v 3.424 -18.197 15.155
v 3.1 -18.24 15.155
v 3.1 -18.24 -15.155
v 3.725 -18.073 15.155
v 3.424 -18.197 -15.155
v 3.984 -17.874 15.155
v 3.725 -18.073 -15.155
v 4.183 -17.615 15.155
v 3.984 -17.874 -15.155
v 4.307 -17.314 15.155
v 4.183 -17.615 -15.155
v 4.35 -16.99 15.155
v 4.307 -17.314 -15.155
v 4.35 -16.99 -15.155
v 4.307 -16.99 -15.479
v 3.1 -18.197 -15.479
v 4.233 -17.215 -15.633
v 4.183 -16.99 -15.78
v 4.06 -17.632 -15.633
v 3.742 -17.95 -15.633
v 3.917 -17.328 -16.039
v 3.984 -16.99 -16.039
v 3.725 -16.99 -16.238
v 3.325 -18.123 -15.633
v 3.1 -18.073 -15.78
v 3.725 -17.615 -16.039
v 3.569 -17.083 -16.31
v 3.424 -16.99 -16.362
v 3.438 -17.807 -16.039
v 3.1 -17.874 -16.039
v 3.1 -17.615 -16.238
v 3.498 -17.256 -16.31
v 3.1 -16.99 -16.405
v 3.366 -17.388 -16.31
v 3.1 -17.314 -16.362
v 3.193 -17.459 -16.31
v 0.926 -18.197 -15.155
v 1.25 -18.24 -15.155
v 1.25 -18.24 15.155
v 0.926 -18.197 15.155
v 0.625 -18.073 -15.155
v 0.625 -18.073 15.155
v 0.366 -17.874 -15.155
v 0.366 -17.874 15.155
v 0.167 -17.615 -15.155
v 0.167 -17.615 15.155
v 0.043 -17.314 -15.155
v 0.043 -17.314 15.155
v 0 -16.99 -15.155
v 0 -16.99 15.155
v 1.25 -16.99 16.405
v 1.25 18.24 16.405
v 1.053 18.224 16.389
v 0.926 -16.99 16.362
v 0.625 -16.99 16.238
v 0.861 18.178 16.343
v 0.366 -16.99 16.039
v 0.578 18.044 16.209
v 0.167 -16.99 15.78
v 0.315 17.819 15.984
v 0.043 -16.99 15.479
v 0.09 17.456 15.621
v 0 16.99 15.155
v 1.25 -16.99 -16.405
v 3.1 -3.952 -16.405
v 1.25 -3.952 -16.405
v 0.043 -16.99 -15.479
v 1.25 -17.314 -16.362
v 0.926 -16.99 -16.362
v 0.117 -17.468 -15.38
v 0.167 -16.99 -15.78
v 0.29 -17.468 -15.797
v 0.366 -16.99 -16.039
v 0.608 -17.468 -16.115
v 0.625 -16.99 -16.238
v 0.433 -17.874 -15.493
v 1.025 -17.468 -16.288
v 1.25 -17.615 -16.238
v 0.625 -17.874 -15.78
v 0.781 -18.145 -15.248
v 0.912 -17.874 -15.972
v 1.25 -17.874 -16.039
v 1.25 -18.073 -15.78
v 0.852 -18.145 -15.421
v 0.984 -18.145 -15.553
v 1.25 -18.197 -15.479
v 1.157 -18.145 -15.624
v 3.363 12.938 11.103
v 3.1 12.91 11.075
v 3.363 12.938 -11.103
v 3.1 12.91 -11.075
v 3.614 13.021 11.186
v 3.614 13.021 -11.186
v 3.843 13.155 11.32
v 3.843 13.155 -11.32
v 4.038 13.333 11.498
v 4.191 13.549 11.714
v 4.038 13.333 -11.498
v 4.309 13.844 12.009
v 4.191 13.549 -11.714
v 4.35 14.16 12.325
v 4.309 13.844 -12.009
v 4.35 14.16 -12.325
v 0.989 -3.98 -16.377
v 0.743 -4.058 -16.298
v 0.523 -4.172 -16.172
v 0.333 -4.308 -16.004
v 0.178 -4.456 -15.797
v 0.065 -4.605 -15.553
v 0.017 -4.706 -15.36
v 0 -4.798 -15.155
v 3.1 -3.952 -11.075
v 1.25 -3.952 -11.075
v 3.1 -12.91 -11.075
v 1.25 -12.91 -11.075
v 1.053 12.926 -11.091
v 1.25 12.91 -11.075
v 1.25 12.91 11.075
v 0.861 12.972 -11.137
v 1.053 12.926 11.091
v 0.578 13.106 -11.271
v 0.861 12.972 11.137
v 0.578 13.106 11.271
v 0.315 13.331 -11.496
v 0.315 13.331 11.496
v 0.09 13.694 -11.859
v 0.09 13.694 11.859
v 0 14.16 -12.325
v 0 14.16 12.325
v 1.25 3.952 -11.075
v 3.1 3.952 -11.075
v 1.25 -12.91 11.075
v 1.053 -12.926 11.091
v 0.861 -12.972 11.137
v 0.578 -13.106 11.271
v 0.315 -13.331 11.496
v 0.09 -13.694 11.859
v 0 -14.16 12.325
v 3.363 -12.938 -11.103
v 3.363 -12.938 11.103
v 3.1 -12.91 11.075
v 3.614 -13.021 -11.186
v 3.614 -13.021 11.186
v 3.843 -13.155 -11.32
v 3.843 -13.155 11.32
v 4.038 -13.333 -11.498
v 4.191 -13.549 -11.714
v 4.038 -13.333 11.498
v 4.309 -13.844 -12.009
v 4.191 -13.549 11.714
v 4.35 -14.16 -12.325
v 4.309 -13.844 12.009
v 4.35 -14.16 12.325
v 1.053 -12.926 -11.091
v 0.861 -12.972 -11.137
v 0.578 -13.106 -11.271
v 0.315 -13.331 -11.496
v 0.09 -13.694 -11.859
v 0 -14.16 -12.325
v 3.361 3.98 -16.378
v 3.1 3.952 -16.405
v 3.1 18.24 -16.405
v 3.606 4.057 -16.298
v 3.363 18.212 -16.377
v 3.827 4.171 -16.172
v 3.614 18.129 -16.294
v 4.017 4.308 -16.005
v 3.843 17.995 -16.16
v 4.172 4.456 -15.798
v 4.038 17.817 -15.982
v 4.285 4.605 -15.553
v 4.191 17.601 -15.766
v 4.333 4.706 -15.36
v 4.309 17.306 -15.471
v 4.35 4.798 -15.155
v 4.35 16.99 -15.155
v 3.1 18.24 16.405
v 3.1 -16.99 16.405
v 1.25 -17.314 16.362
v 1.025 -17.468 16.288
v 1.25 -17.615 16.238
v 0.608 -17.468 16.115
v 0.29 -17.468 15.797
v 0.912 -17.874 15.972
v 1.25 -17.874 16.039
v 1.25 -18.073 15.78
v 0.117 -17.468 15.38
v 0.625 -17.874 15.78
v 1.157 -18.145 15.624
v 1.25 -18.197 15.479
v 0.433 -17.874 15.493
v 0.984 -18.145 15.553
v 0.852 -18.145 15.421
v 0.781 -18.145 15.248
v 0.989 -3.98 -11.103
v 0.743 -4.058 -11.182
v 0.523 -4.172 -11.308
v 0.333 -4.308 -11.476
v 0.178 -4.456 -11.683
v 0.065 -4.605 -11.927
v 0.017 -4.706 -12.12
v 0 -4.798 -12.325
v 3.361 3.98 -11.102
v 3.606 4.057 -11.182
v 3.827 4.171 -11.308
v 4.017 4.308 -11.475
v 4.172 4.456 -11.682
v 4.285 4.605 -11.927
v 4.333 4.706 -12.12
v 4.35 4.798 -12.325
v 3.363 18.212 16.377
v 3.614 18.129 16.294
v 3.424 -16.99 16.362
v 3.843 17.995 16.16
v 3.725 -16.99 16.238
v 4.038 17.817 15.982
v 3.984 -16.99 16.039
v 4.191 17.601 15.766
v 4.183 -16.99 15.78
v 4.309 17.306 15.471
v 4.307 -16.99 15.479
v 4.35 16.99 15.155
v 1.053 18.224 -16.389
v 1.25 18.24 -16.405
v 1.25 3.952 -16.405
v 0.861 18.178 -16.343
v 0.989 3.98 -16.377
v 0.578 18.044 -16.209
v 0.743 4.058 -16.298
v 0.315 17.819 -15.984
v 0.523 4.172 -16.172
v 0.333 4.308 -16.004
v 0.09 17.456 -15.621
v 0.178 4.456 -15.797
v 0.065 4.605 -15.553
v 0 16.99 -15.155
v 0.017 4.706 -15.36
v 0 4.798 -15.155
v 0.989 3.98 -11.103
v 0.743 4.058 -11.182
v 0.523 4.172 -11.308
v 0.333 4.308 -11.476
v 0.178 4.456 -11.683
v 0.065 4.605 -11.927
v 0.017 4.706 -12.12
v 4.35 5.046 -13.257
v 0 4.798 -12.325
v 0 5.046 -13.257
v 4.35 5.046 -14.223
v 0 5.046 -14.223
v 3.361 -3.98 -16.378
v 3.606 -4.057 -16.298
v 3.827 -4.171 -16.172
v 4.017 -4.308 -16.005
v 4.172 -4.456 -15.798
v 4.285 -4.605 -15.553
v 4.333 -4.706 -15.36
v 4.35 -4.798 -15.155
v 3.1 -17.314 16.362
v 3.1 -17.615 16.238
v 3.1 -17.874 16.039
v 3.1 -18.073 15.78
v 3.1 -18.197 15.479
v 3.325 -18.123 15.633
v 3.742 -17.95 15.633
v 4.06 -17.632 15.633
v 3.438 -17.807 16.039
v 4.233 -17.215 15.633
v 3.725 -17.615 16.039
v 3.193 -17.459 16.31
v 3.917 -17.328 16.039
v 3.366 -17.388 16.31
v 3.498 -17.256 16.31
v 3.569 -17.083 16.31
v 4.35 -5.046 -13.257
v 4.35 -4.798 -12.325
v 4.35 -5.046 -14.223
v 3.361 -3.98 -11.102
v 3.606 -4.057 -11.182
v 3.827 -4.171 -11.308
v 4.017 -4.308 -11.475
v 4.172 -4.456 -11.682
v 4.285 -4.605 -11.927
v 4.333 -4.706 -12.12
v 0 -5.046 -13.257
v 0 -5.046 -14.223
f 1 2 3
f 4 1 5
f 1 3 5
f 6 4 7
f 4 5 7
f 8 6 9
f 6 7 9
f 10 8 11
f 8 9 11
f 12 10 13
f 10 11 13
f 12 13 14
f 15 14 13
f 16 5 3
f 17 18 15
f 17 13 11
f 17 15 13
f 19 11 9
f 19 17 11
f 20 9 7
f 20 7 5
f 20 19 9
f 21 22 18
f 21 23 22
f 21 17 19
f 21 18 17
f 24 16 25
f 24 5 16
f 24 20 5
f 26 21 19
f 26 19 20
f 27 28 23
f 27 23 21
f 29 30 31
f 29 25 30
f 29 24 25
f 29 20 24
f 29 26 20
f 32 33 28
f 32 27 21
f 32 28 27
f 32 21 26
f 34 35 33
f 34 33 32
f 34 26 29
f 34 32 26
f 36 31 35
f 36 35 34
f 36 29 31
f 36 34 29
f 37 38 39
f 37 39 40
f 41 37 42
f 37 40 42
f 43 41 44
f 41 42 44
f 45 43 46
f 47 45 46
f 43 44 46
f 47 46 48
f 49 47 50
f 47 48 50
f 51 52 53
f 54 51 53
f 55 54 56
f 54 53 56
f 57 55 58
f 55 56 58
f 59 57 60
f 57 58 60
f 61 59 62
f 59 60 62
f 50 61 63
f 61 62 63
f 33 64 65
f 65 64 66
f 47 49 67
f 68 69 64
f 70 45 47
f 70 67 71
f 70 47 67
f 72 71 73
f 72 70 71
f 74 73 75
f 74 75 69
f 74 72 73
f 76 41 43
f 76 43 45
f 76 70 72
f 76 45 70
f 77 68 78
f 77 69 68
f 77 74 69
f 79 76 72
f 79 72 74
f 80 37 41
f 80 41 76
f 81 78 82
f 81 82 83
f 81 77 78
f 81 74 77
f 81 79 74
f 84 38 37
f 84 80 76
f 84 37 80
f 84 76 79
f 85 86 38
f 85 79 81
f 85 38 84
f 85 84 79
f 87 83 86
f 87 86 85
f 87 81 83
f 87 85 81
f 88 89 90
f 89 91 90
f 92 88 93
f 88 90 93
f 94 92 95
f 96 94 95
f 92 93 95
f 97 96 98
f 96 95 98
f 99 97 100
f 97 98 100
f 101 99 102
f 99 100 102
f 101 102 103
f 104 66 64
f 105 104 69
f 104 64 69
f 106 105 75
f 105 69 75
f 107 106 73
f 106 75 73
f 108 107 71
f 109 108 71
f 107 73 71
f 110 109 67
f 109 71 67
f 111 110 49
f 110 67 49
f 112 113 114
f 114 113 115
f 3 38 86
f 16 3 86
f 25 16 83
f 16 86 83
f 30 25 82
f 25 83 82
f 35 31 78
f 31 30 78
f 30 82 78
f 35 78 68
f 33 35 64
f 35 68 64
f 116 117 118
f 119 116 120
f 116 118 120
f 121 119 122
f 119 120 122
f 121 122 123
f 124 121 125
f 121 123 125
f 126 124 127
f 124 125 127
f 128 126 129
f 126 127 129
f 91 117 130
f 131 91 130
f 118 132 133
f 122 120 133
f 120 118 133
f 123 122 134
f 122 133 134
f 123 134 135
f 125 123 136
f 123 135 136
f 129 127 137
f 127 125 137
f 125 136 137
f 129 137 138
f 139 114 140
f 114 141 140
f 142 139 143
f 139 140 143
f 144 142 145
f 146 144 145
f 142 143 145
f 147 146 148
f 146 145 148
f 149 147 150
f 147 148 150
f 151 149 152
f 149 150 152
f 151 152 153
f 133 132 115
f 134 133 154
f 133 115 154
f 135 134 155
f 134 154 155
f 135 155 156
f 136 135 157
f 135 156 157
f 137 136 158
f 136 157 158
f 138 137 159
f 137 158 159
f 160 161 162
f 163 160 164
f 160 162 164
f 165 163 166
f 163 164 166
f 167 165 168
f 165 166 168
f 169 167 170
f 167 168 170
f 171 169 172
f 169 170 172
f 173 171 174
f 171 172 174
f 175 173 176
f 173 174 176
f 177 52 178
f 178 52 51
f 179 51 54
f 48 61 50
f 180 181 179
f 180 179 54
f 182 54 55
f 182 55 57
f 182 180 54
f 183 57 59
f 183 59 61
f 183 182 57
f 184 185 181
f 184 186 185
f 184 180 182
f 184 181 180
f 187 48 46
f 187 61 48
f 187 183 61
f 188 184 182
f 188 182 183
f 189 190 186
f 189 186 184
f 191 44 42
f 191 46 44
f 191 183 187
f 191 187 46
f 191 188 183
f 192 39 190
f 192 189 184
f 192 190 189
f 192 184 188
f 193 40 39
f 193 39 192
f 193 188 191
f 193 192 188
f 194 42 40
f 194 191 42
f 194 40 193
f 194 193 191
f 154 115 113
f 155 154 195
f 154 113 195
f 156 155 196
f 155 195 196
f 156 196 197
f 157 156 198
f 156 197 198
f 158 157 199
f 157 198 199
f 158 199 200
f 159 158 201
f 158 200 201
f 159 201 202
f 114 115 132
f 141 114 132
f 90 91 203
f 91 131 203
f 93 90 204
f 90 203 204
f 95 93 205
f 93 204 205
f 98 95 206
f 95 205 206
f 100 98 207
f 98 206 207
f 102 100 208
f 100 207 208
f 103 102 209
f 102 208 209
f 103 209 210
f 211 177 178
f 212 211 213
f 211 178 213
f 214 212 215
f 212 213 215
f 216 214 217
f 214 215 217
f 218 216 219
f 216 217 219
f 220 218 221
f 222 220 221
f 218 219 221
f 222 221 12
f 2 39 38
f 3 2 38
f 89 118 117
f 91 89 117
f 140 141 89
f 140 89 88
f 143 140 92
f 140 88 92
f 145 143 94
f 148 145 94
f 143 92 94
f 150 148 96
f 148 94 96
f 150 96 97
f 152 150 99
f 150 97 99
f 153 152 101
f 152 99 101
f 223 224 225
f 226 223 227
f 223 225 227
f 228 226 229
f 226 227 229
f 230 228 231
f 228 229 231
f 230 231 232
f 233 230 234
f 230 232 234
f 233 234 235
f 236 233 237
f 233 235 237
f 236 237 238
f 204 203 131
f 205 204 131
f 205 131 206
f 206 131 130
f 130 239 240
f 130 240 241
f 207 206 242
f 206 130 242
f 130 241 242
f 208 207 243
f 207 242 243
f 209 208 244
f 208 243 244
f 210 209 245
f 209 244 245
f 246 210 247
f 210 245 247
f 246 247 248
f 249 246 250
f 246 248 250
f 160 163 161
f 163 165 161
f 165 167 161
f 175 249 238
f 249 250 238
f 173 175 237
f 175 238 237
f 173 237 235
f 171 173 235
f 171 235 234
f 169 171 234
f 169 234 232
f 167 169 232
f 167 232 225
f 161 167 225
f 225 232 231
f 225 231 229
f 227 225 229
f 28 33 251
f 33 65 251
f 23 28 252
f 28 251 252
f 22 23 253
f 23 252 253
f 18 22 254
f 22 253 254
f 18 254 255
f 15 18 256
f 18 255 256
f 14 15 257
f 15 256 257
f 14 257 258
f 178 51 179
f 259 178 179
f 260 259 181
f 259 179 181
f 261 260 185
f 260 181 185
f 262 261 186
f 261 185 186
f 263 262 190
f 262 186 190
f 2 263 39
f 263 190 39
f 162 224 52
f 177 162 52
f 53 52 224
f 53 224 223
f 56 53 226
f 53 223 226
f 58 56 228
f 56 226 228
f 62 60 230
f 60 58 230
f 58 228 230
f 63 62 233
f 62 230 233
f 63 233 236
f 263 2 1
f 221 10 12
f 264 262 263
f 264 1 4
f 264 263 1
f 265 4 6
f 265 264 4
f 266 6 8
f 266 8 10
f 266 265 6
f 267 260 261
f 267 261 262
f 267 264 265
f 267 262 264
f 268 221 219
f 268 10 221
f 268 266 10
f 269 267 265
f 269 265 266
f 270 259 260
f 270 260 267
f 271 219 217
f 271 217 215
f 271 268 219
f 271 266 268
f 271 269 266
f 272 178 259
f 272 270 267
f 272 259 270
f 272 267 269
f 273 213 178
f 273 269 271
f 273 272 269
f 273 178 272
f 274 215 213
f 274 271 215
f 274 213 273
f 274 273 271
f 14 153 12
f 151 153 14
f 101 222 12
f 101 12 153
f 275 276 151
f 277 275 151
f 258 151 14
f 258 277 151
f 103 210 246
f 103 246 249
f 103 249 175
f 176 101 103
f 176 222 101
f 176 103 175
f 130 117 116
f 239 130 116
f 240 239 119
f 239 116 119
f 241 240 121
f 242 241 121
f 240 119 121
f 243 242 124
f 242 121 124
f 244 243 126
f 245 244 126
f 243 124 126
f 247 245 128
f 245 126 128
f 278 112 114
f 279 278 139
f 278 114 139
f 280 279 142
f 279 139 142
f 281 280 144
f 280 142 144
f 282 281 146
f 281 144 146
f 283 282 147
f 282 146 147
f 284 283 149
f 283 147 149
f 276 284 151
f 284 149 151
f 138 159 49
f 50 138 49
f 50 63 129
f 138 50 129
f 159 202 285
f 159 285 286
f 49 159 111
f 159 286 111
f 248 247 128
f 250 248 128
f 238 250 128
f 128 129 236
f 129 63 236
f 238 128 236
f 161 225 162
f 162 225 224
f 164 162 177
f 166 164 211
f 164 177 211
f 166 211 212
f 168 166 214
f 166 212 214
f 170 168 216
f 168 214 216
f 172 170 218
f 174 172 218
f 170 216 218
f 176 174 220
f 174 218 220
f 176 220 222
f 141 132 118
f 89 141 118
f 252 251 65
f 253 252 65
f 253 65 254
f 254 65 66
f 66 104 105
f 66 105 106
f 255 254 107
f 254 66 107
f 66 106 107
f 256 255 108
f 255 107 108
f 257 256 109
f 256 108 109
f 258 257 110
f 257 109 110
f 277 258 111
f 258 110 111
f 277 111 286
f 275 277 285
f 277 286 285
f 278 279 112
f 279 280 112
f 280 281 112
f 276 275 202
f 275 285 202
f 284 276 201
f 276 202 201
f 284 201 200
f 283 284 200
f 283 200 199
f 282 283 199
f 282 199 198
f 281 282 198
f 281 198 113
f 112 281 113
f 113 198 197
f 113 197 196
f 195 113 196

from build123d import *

# Parameters (mm, degrees)
BOSS_EXTRUDE1_DEPTH = 4.35
FILLET1_R           = 1.25
FILLET2_R           = 1.25


with BuildPart() as part:
    # Sketch1 → Boss-Extrude1 (new body)
    with BuildSketch(Plane(origin=(0, 0, 0), x_dir=(0, 0, -1), z_dir=(1, 0, 0))):
        with BuildLine():
            Line((-11.075, 12.91), (11.075, 12.91))
            Line((11.075, 12.91), (11.075, 3.951551724))
            ThreePointArc((11.075, 3.951551724), (13.74, 5.077445529), (16.405, 3.951551724))
            Line((16.405, 3.951551724), (16.405, 18.24))
            Line((16.405, 18.24), (-16.405, 18.24))
            Line((-16.405, 18.24), (-16.405, -18.24))
            Line((-16.405, -18.24), (16.405, -18.24))
            Line((16.405, -18.24), (16.405, -3.951551724))
            ThreePointArc((16.405, -3.951551724), (13.74, -5.077445529), (11.075, -3.951551724))
            Line((11.075, -3.951551724), (11.075, -12.91))
            Line((11.075, -12.91), (-11.075, -12.91))
            Line((-11.075, -12.91), (-11.075, 12.91))
        make_face()
    extrude(amount=BOSS_EXTRUDE1_DEPTH)

    # Fillet1
    fillet1_edges = [part.edges().sort_by_distance(p)[0] for p in [
        (4.35, 8.430775862, -11.075),
        (4.35, 11.095775862, -16.405),
        (4.35, 18.24, 0),
        (4.35, 0, 16.405),
        (4.35, -18.24, 0),
        (4.35, -11.095775862, -16.405),
        (4.35, -8.430775862, -11.075),
        (4.35, -12.91, 0),
        (4.35, 0, 11.075),
        (4.35, 12.91, 0),
    ]]
    fillet(fillet1_edges, radius=FILLET1_R)

    # Fillet2
    # the kernel refuses this fillet: 1.25 mm, written as the material it takes off along each edge
    with BuildSketch(Plane(origin=(3.1, -16.99, -15.155), x_dir=(0, -1, 0), z_dir=(0, 0, -1))) as fillet2_piece_1_section:
        Polygon((0, 0), (FILLET2_R, 0), (FILLET2_R, -FILLET2_R), (0, -FILLET2_R), align=None)
    fillet2_piece_1 = extrude(amount=FILLET2_R, mode=Mode.PRIVATE)
    fillet2_piece_1 = fillet2_piece_1 - Plane(origin=(3.1, -16.99, -15.155), x_dir=(-0.7071067811865475, 0.7071067811865475, 0), z_dir=(0, 0, -1)) * Sphere(FILLET2_R, mode=Mode.PRIVATE)
    add(fillet2_piece_1, mode=Mode.SUBTRACT)
    with BuildSketch(Plane(origin=(3.1, -16.99, 15.155), x_dir=(0, -1, 0), z_dir=(0, 0, 1))) as fillet2_piece_2_section:
        Polygon((0, 0), (FILLET2_R, 0), (FILLET2_R, FILLET2_R), (0, FILLET2_R), align=None)
    fillet2_piece_2 = extrude(amount=FILLET2_R, mode=Mode.PRIVATE)
    fillet2_piece_2 = fillet2_piece_2 - Plane(origin=(3.1, -16.99, 15.155), x_dir=(-0.7071067811865475, 0.7071067811865475, 0), z_dir=(0, 0, 1)) * Sphere(FILLET2_R, mode=Mode.PRIVATE)
    add(fillet2_piece_2, mode=Mode.SUBTRACT)
    with BuildSketch(Plane(origin=(1.25, -16.99, -15.155), x_dir=(-1, 0, 0), z_dir=(0, -1, 0))) as fillet2_piece_3_section:
        Polygon((0, 0), (FILLET2_R, 0), (FILLET2_R, FILLET2_R), (0, FILLET2_R), align=None)
    fillet2_piece_3 = extrude(amount=FILLET2_R, mode=Mode.PRIVATE)
    fillet2_piece_3 = fillet2_piece_3 - Plane(origin=(1.25, -16.99, -15.155), x_dir=(0.7071067811865475, 0, 0.7071067811865475), z_dir=(0, -1, 0)) * Sphere(FILLET2_R, mode=Mode.PRIVATE)
    add(fillet2_piece_3, mode=Mode.SUBTRACT)
    with BuildSketch(Plane(origin=(1.25, -16.99, 15.155), x_dir=(-1, 0, 0), z_dir=(0, -1, 0))) as fillet2_piece_4_section:
        Polygon((0, 0), (FILLET2_R, 0), (FILLET2_R, -FILLET2_R), (0, -FILLET2_R), align=None)
    fillet2_piece_4 = extrude(amount=FILLET2_R, mode=Mode.PRIVATE)
    fillet2_piece_4 = fillet2_piece_4 - Plane(origin=(1.25, -16.99, 15.155), x_dir=(0.7071067811865475, 0, -0.7071067811865475), z_dir=(0, -1, 0)) * Sphere(FILLET2_R, mode=Mode.PRIVATE)
    add(fillet2_piece_4, mode=Mode.SUBTRACT)
    with BuildSketch(Plane(origin=(0, -12.91, -11.075), x_dir=(0, -1, 0), z_dir=(0, 0, 1)), Plane(origin=(0, 12.91, 11.075), x_dir=(0, 1, 0), z_dir=(0, 0, -1))) as fillet2_piece_5:
        with BuildLine():
            CenterArc((FILLET2_R, FILLET2_R), FILLET2_R, 180, 90)
            Line((0, FILLET2_R), (0, 0))
            Line((0, 0), (FILLET2_R, 0))
        make_face()
    extrude(amount=22.15, mode=Mode.SUBTRACT)
    with BuildSketch(Plane(origin=(0, -0.826551724, -11.075), x_dir=(1, 0, 0), z_dir=(0, -1, 0))) as fillet2_piece_6:
        with BuildLine():
            CenterArc((FILLET2_R, -FILLET2_R), FILLET2_R, 90, 90)
            Line((0, -FILLET2_R), (0, 0))
            Line((0, 0), (FILLET2_R, 0))
        make_face()
    extrude(amount=12.083448276, mode=Mode.SUBTRACT)
    with BuildSketch(Plane(origin=(0, -16.99, -16.405), x_dir=(0, 0, 1), z_dir=(0, 1, 0))) as fillet2_piece_7:
        with BuildLine():
            CenterArc((FILLET2_R, FILLET2_R), FILLET2_R, 180, 90)
            Line((0, FILLET2_R), (0, 0))
            Line((0, 0), (FILLET2_R, 0))
        make_face()
    extrude(amount=16.163448276, mode=Mode.SUBTRACT)
    with BuildSketch(Plane(origin=(0, -18.24, 15.155), x_dir=(0, 1, 0), z_dir=(0, 0, -1))) as fillet2_piece_8:
        with BuildLine():
            CenterArc((FILLET2_R, FILLET2_R), FILLET2_R, 180, 90)
            Line((0, FILLET2_R), (0, 0))
            Line((0, 0), (FILLET2_R, 0))
        make_face()
    extrude(amount=30.31, mode=Mode.SUBTRACT)
    with BuildSketch(Plane(origin=(0, 21.365, 16.405), x_dir=(0, 0, -1), z_dir=(0, -1, 0))) as fillet2_piece_9:
        with BuildLine():
            CenterArc((FILLET2_R, FILLET2_R), FILLET2_R, 180, 90)
            Line((0, FILLET2_R), (0, 0))
            Line((0, 0), (FILLET2_R, 0))
        make_face()
    extrude(amount=38.355, mode=Mode.SUBTRACT)
    with BuildSketch(Plane(origin=(0, 18.24, -19.53), x_dir=(0, -1, 0), z_dir=(0, 0, 1))) as fillet2_piece_10:
        with BuildLine():
            CenterArc((FILLET2_R, FILLET2_R), FILLET2_R, 180, 90)
            Line((0, FILLET2_R), (0, 0))
            Line((0, 0), (FILLET2_R, 0))
        make_face()
    extrude(amount=39.06, mode=Mode.SUBTRACT)
    with BuildSketch(Plane(origin=(0, 0.826551724, -16.405), x_dir=(0, 0, 1), z_dir=(0, 1, 0))) as fillet2_piece_11:
        with BuildLine():
            CenterArc((FILLET2_R, FILLET2_R), FILLET2_R, 180, 90)
            Line((0, FILLET2_R), (0, 0))
            Line((0, 0), (FILLET2_R, 0))
        make_face()
    extrude(amount=20.538448276, mode=Mode.SUBTRACT)
    with BuildSketch(Plane(origin=(0, 12.91, -11.075), x_dir=(0, 0, -1), z_dir=(0, -1, 0))) as fillet2_piece_12:
        with BuildLine():
            CenterArc((FILLET2_R, FILLET2_R), FILLET2_R, 180, 90)
            Line((0, FILLET2_R), (0, 0))
            Line((0, 0), (FILLET2_R, 0))
        make_face()
    extrude(amount=12.083448276, mode=Mode.SUBTRACT)
    with BuildSketch(Plane(origin=(0, -12.91, 11.075), x_dir=(0, 0, 1), z_dir=(0, 1, 0))) as fillet2_piece_13:
        with BuildLine():
            CenterArc((FILLET2_R, FILLET2_R), FILLET2_R, 180, 90)
            Line((0, FILLET2_R), (0, 0))
            Line((0, 0), (FILLET2_R, 0))
        make_face()
    extrude(amount=25.82, mode=Mode.SUBTRACT)
    with BuildSketch(Plane(origin=(1.25, -18.24, 16.405), x_dir=(0, 1, 0), z_dir=(1, 0, 0))) as fillet2_piece_14:
        with BuildLine():
            CenterArc((FILLET2_R, -FILLET2_R), FILLET2_R, 90, 90)
            Line((0, -FILLET2_R), (0, 0))
            Line((0, 0), (FILLET2_R, 0))
        make_face()
    extrude(amount=1.85, mode=Mode.SUBTRACT)
    with BuildSketch(Plane(origin=(1.25, -18.24, -16.405), x_dir=(0, 1, 0), z_dir=(1, 0, 0))) as fillet2_piece_15:
        with BuildLine():
            CenterArc((FILLET2_R, FILLET2_R), FILLET2_R, 180, 90)
            Line((0, FILLET2_R), (0, 0))
            Line((0, 0), (FILLET2_R, 0))
        make_face()
    extrude(amount=1.85, mode=Mode.SUBTRACT)
    with BuildSketch(Plane(origin=(0, -0.826551724, -11.075), x_dir=(1, 0, 0), z_dir=(0, -1, 0))) as fillet2_piece_16a_section:
        with BuildLine():
            CenterArc((FILLET2_R, -FILLET2_R), FILLET2_R, 90, 90)
            Line((0, -FILLET2_R), (0, 0))
            Line((0, 0), (FILLET2_R, 0))
        make_face()
    fillet2_piece_16a = extrude(amount=15.208448276, mode=Mode.PRIVATE)
    fillet2_piece_16a = split(fillet2_piece_16a, bisect_by=Plane(origin=(0.282993893, -12.91, -11.357993893), z_dir=(0, -1, 0)), keep=Keep.TOP, mode=Mode.PRIVATE)
    with BuildSketch(Plane(origin=(0, -12.91, -14.2), x_dir=(0, -1, 0), z_dir=(0, 0, 1))) as fillet2_piece_16b_section:
        with BuildLine():
            CenterArc((FILLET2_R, FILLET2_R), FILLET2_R, 180, 90)
            Line((0, FILLET2_R), (0, 0))
            Line((0, 0), (FILLET2_R, 0))
        make_face()
    fillet2_piece_16b = extrude(amount=25.275, mode=Mode.PRIVATE)
    fillet2_piece_16b = split(fillet2_piece_16b, bisect_by=Plane(origin=(0.282993893, -13.192993893, -11.075), z_dir=(0, 0, -1)), keep=Keep.TOP, mode=Mode.PRIVATE)
    fillet2_piece_16 = fillet2_piece_16a & fillet2_piece_16b
    add(fillet2_piece_16, mode=Mode.SUBTRACT)
    with BuildSketch(Plane(origin=(0, -12.91, -11.075), x_dir=(0, -1, 0), z_dir=(0, 0, 1))) as fillet2_piece_17a_section:
        with BuildLine():
            CenterArc((FILLET2_R, FILLET2_R), FILLET2_R, 180, 90)
            Line((0, FILLET2_R), (0, 0))
            Line((0, 0), (FILLET2_R, 0))
        make_face()
    fillet2_piece_17a = extrude(amount=25.275, mode=Mode.PRIVATE)
    fillet2_piece_17a = split(fillet2_piece_17a, bisect_by=Plane(origin=(0.282993893, -13.192993893, 11.075), z_dir=(0, 0, 1)), keep=Keep.TOP, mode=Mode.PRIVATE)
    with BuildSketch(Plane(origin=(0, -16.035, 11.075), x_dir=(0, 0, 1), z_dir=(0, 1, 0))) as fillet2_piece_17b_section:
        with BuildLine():
            CenterArc((FILLET2_R, FILLET2_R), FILLET2_R, 180, 90)
            Line((0, FILLET2_R), (0, 0))
            Line((0, 0), (FILLET2_R, 0))
        make_face()
    fillet2_piece_17b = extrude(amount=28.945, mode=Mode.PRIVATE)
    fillet2_piece_17b = split(fillet2_piece_17b, bisect_by=Plane(origin=(0.282993893, -12.91, 11.357993893), z_dir=(0, -1, 0)), keep=Keep.TOP, mode=Mode.PRIVATE)
    fillet2_piece_17 = fillet2_piece_17a & fillet2_piece_17b
    add(fillet2_piece_17, mode=Mode.SUBTRACT)
    with BuildSketch(Plane(origin=(0, 12.91, 11.075), x_dir=(0, 1, 0), z_dir=(0, 0, -1))) as fillet2_piece_18a_section:
        with BuildLine():
            CenterArc((FILLET2_R, FILLET2_R), FILLET2_R, 180, 90)
            Line((0, FILLET2_R), (0, 0))
            Line((0, 0), (FILLET2_R, 0))
        make_face()
    fillet2_piece_18a = extrude(amount=25.275, mode=Mode.PRIVATE)
    fillet2_piece_18a = split(fillet2_piece_18a, bisect_by=Plane(origin=(0.282993893, 13.192993893, -11.075), z_dir=(0, 0, -1)), keep=Keep.TOP, mode=Mode.PRIVATE)
    with BuildSketch(Plane(origin=(0, 16.035, -11.075), x_dir=(0, 0, -1), z_dir=(0, -1, 0))) as fillet2_piece_18b_section:
        with BuildLine():
            CenterArc((FILLET2_R, FILLET2_R), FILLET2_R, 180, 90)
            Line((0, FILLET2_R), (0, 0))
            Line((0, 0), (FILLET2_R, 0))
        make_face()
    fillet2_piece_18b = extrude(amount=15.208448276, mode=Mode.PRIVATE)
    fillet2_piece_18b = split(fillet2_piece_18b, bisect_by=Plane(origin=(0.282993893, 12.91, -11.357993893), z_dir=(0, 1, 0)), keep=Keep.TOP, mode=Mode.PRIVATE)
    fillet2_piece_18 = fillet2_piece_18a & fillet2_piece_18b
    add(fillet2_piece_18, mode=Mode.SUBTRACT)
    with BuildSketch(Plane(origin=(0, -12.91, 11.075), x_dir=(0, 0, 1), z_dir=(0, 1, 0))) as fillet2_piece_19a_section:
        with BuildLine():
            CenterArc((FILLET2_R, FILLET2_R), FILLET2_R, 180, 90)
            Line((0, FILLET2_R), (0, 0))
            Line((0, 0), (FILLET2_R, 0))
        make_face()
    fillet2_piece_19a = extrude(amount=28.945, mode=Mode.PRIVATE)
    fillet2_piece_19a = split(fillet2_piece_19a, bisect_by=Plane(origin=(0.282993893, 12.91, 11.357993893), z_dir=(0, 1, 0)), keep=Keep.TOP, mode=Mode.PRIVATE)
    with BuildSketch(Plane(origin=(0, 12.91, 14.2), x_dir=(0, 1, 0), z_dir=(0, 0, -1))) as fillet2_piece_19b_section:
        with BuildLine():
            CenterArc((FILLET2_R, FILLET2_R), FILLET2_R, 180, 90)
            Line((0, FILLET2_R), (0, 0))
            Line((0, 0), (FILLET2_R, 0))
        make_face()
    fillet2_piece_19b = extrude(amount=25.275, mode=Mode.PRIVATE)
    fillet2_piece_19b = split(fillet2_piece_19b, bisect_by=Plane(origin=(0.282993893, 13.192993893, 11.075), z_dir=(0, 0, 1)), keep=Keep.TOP, mode=Mode.PRIVATE)
    fillet2_piece_19 = fillet2_piece_19a & fillet2_piece_19b
    add(fillet2_piece_19, mode=Mode.SUBTRACT)


solid = part.part
